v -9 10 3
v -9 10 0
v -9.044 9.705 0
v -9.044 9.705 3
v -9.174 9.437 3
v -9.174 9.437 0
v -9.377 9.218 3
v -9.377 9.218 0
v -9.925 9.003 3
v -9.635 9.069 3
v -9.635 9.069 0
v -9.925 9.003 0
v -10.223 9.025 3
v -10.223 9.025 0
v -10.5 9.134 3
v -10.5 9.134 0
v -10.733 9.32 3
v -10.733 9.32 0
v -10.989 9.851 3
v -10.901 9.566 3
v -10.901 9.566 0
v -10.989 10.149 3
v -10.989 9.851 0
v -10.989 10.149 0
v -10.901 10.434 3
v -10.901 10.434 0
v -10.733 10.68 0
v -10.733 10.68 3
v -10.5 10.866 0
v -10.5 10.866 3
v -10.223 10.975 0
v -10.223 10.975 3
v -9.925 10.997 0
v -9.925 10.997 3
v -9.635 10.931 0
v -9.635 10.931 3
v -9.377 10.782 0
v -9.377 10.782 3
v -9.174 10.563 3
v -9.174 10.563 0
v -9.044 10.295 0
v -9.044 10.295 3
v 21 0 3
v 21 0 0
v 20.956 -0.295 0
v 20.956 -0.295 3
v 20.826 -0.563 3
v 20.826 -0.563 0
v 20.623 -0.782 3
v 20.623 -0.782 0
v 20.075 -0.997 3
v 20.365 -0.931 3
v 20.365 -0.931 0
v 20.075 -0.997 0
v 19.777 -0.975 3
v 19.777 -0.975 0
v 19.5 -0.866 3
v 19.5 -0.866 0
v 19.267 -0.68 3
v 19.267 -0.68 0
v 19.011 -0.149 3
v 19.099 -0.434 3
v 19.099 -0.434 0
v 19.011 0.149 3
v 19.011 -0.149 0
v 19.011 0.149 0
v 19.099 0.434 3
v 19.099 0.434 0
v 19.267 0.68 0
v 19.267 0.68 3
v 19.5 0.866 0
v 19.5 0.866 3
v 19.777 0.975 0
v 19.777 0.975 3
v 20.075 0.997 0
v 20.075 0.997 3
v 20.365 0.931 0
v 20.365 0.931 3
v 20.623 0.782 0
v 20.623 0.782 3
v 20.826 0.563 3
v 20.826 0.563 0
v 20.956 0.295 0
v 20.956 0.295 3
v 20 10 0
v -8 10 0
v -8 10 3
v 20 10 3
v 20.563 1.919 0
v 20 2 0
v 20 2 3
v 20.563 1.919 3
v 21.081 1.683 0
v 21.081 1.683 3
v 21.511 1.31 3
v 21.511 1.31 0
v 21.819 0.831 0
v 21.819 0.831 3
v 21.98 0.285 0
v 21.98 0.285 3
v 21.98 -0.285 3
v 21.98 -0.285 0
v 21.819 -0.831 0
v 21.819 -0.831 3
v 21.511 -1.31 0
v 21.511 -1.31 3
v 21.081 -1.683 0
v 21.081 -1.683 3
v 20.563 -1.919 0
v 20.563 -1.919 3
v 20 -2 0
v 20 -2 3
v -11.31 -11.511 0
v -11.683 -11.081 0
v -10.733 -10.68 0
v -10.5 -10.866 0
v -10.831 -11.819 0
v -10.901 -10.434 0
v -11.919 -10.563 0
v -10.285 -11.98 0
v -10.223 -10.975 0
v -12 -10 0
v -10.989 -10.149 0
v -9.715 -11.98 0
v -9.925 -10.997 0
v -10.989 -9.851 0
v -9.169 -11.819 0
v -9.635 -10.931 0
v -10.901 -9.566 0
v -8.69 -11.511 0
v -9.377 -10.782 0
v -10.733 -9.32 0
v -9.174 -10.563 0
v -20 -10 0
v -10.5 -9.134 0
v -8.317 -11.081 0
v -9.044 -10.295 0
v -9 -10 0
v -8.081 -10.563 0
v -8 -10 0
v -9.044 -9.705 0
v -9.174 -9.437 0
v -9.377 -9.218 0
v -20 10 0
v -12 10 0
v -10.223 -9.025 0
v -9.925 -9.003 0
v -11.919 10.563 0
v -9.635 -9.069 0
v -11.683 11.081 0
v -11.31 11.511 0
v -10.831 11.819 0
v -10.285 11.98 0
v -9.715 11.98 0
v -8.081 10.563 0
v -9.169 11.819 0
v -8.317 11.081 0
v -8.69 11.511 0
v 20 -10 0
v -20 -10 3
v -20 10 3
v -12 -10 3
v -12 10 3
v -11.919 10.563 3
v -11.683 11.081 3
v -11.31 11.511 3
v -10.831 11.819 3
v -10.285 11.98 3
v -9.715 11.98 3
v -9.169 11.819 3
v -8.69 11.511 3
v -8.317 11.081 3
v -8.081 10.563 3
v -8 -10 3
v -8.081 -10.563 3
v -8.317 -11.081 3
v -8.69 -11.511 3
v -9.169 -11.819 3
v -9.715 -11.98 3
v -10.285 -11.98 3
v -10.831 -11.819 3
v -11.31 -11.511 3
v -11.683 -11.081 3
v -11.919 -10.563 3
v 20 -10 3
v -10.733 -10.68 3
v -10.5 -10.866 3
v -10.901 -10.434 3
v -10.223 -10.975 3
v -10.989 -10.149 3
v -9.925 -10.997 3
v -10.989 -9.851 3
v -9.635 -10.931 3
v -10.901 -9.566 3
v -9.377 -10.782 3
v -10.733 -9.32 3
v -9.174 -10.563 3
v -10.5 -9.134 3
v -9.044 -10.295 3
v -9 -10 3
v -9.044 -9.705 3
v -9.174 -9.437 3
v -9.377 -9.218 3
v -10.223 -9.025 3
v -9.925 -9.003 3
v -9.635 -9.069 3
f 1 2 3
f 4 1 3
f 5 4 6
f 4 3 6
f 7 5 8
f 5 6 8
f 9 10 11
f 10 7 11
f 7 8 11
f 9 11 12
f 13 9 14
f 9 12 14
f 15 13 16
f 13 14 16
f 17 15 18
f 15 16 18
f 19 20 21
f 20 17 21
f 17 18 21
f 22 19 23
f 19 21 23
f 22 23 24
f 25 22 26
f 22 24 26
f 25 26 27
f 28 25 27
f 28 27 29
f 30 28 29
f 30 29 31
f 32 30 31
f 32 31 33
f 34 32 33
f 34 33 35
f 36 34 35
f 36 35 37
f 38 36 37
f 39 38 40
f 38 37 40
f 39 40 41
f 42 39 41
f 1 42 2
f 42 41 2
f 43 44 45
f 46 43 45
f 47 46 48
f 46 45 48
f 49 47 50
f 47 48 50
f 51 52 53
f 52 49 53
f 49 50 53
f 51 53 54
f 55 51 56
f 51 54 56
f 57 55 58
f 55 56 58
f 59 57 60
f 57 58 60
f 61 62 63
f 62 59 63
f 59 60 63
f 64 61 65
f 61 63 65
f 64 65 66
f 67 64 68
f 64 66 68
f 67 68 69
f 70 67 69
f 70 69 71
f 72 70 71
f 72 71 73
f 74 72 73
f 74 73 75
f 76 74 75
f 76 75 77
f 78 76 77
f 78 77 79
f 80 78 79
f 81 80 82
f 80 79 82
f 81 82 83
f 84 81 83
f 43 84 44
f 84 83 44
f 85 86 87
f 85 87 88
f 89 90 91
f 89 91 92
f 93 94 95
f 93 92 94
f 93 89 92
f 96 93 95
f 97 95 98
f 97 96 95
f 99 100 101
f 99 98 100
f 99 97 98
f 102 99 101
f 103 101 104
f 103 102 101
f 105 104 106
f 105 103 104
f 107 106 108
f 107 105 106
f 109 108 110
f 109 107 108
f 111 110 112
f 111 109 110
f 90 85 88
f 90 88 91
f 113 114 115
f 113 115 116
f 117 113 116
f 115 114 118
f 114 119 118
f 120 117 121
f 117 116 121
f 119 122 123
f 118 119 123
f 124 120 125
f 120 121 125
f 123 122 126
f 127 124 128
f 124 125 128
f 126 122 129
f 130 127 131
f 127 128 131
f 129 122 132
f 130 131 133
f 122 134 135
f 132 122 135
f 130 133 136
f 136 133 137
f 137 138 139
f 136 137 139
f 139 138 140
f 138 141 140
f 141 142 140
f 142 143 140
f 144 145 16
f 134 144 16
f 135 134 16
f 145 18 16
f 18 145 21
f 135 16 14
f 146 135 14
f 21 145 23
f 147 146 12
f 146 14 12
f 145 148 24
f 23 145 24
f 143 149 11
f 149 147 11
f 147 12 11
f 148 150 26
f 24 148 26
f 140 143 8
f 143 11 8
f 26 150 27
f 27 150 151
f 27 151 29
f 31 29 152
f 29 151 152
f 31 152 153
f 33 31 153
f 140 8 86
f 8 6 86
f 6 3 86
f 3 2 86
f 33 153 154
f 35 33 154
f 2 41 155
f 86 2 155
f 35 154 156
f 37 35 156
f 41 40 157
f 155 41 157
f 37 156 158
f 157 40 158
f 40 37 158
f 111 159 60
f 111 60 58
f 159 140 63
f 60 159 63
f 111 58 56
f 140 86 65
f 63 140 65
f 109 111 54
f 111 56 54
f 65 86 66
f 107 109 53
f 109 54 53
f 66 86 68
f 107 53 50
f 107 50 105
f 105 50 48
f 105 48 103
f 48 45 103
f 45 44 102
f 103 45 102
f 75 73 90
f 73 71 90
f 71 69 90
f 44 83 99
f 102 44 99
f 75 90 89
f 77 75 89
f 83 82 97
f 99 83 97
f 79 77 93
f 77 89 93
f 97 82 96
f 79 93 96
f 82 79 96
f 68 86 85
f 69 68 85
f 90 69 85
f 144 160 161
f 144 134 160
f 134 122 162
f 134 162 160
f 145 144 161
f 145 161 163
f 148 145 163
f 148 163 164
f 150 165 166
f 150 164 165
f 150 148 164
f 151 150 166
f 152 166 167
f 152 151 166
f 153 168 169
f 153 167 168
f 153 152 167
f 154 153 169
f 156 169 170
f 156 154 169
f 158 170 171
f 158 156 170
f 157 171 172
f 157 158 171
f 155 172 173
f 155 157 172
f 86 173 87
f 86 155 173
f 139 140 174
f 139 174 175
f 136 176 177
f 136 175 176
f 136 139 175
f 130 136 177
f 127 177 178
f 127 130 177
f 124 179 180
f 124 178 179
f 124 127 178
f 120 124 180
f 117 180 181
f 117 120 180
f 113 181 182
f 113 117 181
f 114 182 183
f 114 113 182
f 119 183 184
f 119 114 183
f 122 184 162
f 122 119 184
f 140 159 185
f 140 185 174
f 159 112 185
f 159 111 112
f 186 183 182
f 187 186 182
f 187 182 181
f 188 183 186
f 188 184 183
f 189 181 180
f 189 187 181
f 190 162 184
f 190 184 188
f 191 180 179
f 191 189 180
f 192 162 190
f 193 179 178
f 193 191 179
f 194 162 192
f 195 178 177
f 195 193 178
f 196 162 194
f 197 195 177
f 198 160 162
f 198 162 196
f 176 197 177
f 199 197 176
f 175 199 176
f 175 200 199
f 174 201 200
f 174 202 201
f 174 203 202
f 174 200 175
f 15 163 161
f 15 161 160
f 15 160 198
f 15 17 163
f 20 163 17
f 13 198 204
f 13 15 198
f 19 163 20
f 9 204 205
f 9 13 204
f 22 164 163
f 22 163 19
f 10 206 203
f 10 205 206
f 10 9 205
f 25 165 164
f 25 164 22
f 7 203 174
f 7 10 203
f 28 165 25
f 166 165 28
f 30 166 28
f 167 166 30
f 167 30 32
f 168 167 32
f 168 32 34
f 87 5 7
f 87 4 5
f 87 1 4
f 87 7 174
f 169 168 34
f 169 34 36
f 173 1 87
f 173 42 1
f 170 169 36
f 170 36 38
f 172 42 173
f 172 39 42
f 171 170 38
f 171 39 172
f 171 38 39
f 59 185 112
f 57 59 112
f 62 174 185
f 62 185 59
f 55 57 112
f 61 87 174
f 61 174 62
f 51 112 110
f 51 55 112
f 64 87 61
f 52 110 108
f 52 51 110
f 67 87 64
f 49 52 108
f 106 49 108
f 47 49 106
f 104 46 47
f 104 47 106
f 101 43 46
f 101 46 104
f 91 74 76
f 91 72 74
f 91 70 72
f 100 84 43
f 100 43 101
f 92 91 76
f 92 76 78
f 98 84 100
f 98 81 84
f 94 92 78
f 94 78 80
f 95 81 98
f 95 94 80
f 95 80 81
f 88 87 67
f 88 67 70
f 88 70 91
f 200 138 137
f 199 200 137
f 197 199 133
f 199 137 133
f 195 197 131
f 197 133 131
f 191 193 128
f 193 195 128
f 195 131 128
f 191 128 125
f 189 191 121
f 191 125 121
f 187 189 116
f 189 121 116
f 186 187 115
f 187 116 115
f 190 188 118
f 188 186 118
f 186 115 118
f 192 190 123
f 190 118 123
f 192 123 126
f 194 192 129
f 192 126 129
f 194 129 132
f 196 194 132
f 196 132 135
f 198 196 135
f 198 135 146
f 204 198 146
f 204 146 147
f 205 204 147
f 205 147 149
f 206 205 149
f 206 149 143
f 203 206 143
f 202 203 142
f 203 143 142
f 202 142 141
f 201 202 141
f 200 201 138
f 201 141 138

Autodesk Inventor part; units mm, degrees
ref_plane "YZ Plane" through (0, 0, 0) normal (1, 0, 0) x (0, 1, 0)
ref_plane "XZ Plane" through (0, 0, 0) normal (0, 1, 0) x (-1, 0, 0)
ref_plane "XY Plane" through (0, 0, 0) normal (0, 0, 1) x (1, 0, 0)
sketch "Sketch1" plane through (0, 0, 0) normal (0, 0, 1) x (1, 0, 0)
  line L0 (-20, -10) -> (-20, 10)
  circle A0 centre (20, 0) radius 1
  arc A1 (20, -2) -> (20, 2) centre (20, 0) ccw
  line L1 (20, 10) -> (20, 2)
  line L2 (20, -2) -> (20, -10)
  circle A2 centre (-10, -10) radius 1
  arc A3 (-12, -10) -> (-8, -10) centre (-10, -10) ccw
  circle A4 centre (-10, 10) radius 1
  arc A5 (-8, 10) -> (-12, 10) centre (-10, 10) ccw
  line L3 (20, -10) -> (-8, -10)
  line L4 (-12, -10) -> (-20, -10)
  line L5 (-10, -10) -> (-9, -10)
  line L6 (-8, -10) -> (20, -10)
  line L7 (-20, 10) -> (-12, 10)
  line L8 (-8, 10) -> (20, 10)
  point P0 (0, 0)
  dimension "d8" = 2
  dimension "d0" = 20
  dimension "d1" = 40
  dimension "d4" = 2
  dimension "d5" = 4
  dimension "d6" = 0
  dimension "d7" = 10
  dimension "d9" = 4
  dimension "d10" = 2
  dimension "d11" = 4
extrude "Extrusion1" add sketch "Sketch1" along normal blind 3
properties part number "current sensor"
